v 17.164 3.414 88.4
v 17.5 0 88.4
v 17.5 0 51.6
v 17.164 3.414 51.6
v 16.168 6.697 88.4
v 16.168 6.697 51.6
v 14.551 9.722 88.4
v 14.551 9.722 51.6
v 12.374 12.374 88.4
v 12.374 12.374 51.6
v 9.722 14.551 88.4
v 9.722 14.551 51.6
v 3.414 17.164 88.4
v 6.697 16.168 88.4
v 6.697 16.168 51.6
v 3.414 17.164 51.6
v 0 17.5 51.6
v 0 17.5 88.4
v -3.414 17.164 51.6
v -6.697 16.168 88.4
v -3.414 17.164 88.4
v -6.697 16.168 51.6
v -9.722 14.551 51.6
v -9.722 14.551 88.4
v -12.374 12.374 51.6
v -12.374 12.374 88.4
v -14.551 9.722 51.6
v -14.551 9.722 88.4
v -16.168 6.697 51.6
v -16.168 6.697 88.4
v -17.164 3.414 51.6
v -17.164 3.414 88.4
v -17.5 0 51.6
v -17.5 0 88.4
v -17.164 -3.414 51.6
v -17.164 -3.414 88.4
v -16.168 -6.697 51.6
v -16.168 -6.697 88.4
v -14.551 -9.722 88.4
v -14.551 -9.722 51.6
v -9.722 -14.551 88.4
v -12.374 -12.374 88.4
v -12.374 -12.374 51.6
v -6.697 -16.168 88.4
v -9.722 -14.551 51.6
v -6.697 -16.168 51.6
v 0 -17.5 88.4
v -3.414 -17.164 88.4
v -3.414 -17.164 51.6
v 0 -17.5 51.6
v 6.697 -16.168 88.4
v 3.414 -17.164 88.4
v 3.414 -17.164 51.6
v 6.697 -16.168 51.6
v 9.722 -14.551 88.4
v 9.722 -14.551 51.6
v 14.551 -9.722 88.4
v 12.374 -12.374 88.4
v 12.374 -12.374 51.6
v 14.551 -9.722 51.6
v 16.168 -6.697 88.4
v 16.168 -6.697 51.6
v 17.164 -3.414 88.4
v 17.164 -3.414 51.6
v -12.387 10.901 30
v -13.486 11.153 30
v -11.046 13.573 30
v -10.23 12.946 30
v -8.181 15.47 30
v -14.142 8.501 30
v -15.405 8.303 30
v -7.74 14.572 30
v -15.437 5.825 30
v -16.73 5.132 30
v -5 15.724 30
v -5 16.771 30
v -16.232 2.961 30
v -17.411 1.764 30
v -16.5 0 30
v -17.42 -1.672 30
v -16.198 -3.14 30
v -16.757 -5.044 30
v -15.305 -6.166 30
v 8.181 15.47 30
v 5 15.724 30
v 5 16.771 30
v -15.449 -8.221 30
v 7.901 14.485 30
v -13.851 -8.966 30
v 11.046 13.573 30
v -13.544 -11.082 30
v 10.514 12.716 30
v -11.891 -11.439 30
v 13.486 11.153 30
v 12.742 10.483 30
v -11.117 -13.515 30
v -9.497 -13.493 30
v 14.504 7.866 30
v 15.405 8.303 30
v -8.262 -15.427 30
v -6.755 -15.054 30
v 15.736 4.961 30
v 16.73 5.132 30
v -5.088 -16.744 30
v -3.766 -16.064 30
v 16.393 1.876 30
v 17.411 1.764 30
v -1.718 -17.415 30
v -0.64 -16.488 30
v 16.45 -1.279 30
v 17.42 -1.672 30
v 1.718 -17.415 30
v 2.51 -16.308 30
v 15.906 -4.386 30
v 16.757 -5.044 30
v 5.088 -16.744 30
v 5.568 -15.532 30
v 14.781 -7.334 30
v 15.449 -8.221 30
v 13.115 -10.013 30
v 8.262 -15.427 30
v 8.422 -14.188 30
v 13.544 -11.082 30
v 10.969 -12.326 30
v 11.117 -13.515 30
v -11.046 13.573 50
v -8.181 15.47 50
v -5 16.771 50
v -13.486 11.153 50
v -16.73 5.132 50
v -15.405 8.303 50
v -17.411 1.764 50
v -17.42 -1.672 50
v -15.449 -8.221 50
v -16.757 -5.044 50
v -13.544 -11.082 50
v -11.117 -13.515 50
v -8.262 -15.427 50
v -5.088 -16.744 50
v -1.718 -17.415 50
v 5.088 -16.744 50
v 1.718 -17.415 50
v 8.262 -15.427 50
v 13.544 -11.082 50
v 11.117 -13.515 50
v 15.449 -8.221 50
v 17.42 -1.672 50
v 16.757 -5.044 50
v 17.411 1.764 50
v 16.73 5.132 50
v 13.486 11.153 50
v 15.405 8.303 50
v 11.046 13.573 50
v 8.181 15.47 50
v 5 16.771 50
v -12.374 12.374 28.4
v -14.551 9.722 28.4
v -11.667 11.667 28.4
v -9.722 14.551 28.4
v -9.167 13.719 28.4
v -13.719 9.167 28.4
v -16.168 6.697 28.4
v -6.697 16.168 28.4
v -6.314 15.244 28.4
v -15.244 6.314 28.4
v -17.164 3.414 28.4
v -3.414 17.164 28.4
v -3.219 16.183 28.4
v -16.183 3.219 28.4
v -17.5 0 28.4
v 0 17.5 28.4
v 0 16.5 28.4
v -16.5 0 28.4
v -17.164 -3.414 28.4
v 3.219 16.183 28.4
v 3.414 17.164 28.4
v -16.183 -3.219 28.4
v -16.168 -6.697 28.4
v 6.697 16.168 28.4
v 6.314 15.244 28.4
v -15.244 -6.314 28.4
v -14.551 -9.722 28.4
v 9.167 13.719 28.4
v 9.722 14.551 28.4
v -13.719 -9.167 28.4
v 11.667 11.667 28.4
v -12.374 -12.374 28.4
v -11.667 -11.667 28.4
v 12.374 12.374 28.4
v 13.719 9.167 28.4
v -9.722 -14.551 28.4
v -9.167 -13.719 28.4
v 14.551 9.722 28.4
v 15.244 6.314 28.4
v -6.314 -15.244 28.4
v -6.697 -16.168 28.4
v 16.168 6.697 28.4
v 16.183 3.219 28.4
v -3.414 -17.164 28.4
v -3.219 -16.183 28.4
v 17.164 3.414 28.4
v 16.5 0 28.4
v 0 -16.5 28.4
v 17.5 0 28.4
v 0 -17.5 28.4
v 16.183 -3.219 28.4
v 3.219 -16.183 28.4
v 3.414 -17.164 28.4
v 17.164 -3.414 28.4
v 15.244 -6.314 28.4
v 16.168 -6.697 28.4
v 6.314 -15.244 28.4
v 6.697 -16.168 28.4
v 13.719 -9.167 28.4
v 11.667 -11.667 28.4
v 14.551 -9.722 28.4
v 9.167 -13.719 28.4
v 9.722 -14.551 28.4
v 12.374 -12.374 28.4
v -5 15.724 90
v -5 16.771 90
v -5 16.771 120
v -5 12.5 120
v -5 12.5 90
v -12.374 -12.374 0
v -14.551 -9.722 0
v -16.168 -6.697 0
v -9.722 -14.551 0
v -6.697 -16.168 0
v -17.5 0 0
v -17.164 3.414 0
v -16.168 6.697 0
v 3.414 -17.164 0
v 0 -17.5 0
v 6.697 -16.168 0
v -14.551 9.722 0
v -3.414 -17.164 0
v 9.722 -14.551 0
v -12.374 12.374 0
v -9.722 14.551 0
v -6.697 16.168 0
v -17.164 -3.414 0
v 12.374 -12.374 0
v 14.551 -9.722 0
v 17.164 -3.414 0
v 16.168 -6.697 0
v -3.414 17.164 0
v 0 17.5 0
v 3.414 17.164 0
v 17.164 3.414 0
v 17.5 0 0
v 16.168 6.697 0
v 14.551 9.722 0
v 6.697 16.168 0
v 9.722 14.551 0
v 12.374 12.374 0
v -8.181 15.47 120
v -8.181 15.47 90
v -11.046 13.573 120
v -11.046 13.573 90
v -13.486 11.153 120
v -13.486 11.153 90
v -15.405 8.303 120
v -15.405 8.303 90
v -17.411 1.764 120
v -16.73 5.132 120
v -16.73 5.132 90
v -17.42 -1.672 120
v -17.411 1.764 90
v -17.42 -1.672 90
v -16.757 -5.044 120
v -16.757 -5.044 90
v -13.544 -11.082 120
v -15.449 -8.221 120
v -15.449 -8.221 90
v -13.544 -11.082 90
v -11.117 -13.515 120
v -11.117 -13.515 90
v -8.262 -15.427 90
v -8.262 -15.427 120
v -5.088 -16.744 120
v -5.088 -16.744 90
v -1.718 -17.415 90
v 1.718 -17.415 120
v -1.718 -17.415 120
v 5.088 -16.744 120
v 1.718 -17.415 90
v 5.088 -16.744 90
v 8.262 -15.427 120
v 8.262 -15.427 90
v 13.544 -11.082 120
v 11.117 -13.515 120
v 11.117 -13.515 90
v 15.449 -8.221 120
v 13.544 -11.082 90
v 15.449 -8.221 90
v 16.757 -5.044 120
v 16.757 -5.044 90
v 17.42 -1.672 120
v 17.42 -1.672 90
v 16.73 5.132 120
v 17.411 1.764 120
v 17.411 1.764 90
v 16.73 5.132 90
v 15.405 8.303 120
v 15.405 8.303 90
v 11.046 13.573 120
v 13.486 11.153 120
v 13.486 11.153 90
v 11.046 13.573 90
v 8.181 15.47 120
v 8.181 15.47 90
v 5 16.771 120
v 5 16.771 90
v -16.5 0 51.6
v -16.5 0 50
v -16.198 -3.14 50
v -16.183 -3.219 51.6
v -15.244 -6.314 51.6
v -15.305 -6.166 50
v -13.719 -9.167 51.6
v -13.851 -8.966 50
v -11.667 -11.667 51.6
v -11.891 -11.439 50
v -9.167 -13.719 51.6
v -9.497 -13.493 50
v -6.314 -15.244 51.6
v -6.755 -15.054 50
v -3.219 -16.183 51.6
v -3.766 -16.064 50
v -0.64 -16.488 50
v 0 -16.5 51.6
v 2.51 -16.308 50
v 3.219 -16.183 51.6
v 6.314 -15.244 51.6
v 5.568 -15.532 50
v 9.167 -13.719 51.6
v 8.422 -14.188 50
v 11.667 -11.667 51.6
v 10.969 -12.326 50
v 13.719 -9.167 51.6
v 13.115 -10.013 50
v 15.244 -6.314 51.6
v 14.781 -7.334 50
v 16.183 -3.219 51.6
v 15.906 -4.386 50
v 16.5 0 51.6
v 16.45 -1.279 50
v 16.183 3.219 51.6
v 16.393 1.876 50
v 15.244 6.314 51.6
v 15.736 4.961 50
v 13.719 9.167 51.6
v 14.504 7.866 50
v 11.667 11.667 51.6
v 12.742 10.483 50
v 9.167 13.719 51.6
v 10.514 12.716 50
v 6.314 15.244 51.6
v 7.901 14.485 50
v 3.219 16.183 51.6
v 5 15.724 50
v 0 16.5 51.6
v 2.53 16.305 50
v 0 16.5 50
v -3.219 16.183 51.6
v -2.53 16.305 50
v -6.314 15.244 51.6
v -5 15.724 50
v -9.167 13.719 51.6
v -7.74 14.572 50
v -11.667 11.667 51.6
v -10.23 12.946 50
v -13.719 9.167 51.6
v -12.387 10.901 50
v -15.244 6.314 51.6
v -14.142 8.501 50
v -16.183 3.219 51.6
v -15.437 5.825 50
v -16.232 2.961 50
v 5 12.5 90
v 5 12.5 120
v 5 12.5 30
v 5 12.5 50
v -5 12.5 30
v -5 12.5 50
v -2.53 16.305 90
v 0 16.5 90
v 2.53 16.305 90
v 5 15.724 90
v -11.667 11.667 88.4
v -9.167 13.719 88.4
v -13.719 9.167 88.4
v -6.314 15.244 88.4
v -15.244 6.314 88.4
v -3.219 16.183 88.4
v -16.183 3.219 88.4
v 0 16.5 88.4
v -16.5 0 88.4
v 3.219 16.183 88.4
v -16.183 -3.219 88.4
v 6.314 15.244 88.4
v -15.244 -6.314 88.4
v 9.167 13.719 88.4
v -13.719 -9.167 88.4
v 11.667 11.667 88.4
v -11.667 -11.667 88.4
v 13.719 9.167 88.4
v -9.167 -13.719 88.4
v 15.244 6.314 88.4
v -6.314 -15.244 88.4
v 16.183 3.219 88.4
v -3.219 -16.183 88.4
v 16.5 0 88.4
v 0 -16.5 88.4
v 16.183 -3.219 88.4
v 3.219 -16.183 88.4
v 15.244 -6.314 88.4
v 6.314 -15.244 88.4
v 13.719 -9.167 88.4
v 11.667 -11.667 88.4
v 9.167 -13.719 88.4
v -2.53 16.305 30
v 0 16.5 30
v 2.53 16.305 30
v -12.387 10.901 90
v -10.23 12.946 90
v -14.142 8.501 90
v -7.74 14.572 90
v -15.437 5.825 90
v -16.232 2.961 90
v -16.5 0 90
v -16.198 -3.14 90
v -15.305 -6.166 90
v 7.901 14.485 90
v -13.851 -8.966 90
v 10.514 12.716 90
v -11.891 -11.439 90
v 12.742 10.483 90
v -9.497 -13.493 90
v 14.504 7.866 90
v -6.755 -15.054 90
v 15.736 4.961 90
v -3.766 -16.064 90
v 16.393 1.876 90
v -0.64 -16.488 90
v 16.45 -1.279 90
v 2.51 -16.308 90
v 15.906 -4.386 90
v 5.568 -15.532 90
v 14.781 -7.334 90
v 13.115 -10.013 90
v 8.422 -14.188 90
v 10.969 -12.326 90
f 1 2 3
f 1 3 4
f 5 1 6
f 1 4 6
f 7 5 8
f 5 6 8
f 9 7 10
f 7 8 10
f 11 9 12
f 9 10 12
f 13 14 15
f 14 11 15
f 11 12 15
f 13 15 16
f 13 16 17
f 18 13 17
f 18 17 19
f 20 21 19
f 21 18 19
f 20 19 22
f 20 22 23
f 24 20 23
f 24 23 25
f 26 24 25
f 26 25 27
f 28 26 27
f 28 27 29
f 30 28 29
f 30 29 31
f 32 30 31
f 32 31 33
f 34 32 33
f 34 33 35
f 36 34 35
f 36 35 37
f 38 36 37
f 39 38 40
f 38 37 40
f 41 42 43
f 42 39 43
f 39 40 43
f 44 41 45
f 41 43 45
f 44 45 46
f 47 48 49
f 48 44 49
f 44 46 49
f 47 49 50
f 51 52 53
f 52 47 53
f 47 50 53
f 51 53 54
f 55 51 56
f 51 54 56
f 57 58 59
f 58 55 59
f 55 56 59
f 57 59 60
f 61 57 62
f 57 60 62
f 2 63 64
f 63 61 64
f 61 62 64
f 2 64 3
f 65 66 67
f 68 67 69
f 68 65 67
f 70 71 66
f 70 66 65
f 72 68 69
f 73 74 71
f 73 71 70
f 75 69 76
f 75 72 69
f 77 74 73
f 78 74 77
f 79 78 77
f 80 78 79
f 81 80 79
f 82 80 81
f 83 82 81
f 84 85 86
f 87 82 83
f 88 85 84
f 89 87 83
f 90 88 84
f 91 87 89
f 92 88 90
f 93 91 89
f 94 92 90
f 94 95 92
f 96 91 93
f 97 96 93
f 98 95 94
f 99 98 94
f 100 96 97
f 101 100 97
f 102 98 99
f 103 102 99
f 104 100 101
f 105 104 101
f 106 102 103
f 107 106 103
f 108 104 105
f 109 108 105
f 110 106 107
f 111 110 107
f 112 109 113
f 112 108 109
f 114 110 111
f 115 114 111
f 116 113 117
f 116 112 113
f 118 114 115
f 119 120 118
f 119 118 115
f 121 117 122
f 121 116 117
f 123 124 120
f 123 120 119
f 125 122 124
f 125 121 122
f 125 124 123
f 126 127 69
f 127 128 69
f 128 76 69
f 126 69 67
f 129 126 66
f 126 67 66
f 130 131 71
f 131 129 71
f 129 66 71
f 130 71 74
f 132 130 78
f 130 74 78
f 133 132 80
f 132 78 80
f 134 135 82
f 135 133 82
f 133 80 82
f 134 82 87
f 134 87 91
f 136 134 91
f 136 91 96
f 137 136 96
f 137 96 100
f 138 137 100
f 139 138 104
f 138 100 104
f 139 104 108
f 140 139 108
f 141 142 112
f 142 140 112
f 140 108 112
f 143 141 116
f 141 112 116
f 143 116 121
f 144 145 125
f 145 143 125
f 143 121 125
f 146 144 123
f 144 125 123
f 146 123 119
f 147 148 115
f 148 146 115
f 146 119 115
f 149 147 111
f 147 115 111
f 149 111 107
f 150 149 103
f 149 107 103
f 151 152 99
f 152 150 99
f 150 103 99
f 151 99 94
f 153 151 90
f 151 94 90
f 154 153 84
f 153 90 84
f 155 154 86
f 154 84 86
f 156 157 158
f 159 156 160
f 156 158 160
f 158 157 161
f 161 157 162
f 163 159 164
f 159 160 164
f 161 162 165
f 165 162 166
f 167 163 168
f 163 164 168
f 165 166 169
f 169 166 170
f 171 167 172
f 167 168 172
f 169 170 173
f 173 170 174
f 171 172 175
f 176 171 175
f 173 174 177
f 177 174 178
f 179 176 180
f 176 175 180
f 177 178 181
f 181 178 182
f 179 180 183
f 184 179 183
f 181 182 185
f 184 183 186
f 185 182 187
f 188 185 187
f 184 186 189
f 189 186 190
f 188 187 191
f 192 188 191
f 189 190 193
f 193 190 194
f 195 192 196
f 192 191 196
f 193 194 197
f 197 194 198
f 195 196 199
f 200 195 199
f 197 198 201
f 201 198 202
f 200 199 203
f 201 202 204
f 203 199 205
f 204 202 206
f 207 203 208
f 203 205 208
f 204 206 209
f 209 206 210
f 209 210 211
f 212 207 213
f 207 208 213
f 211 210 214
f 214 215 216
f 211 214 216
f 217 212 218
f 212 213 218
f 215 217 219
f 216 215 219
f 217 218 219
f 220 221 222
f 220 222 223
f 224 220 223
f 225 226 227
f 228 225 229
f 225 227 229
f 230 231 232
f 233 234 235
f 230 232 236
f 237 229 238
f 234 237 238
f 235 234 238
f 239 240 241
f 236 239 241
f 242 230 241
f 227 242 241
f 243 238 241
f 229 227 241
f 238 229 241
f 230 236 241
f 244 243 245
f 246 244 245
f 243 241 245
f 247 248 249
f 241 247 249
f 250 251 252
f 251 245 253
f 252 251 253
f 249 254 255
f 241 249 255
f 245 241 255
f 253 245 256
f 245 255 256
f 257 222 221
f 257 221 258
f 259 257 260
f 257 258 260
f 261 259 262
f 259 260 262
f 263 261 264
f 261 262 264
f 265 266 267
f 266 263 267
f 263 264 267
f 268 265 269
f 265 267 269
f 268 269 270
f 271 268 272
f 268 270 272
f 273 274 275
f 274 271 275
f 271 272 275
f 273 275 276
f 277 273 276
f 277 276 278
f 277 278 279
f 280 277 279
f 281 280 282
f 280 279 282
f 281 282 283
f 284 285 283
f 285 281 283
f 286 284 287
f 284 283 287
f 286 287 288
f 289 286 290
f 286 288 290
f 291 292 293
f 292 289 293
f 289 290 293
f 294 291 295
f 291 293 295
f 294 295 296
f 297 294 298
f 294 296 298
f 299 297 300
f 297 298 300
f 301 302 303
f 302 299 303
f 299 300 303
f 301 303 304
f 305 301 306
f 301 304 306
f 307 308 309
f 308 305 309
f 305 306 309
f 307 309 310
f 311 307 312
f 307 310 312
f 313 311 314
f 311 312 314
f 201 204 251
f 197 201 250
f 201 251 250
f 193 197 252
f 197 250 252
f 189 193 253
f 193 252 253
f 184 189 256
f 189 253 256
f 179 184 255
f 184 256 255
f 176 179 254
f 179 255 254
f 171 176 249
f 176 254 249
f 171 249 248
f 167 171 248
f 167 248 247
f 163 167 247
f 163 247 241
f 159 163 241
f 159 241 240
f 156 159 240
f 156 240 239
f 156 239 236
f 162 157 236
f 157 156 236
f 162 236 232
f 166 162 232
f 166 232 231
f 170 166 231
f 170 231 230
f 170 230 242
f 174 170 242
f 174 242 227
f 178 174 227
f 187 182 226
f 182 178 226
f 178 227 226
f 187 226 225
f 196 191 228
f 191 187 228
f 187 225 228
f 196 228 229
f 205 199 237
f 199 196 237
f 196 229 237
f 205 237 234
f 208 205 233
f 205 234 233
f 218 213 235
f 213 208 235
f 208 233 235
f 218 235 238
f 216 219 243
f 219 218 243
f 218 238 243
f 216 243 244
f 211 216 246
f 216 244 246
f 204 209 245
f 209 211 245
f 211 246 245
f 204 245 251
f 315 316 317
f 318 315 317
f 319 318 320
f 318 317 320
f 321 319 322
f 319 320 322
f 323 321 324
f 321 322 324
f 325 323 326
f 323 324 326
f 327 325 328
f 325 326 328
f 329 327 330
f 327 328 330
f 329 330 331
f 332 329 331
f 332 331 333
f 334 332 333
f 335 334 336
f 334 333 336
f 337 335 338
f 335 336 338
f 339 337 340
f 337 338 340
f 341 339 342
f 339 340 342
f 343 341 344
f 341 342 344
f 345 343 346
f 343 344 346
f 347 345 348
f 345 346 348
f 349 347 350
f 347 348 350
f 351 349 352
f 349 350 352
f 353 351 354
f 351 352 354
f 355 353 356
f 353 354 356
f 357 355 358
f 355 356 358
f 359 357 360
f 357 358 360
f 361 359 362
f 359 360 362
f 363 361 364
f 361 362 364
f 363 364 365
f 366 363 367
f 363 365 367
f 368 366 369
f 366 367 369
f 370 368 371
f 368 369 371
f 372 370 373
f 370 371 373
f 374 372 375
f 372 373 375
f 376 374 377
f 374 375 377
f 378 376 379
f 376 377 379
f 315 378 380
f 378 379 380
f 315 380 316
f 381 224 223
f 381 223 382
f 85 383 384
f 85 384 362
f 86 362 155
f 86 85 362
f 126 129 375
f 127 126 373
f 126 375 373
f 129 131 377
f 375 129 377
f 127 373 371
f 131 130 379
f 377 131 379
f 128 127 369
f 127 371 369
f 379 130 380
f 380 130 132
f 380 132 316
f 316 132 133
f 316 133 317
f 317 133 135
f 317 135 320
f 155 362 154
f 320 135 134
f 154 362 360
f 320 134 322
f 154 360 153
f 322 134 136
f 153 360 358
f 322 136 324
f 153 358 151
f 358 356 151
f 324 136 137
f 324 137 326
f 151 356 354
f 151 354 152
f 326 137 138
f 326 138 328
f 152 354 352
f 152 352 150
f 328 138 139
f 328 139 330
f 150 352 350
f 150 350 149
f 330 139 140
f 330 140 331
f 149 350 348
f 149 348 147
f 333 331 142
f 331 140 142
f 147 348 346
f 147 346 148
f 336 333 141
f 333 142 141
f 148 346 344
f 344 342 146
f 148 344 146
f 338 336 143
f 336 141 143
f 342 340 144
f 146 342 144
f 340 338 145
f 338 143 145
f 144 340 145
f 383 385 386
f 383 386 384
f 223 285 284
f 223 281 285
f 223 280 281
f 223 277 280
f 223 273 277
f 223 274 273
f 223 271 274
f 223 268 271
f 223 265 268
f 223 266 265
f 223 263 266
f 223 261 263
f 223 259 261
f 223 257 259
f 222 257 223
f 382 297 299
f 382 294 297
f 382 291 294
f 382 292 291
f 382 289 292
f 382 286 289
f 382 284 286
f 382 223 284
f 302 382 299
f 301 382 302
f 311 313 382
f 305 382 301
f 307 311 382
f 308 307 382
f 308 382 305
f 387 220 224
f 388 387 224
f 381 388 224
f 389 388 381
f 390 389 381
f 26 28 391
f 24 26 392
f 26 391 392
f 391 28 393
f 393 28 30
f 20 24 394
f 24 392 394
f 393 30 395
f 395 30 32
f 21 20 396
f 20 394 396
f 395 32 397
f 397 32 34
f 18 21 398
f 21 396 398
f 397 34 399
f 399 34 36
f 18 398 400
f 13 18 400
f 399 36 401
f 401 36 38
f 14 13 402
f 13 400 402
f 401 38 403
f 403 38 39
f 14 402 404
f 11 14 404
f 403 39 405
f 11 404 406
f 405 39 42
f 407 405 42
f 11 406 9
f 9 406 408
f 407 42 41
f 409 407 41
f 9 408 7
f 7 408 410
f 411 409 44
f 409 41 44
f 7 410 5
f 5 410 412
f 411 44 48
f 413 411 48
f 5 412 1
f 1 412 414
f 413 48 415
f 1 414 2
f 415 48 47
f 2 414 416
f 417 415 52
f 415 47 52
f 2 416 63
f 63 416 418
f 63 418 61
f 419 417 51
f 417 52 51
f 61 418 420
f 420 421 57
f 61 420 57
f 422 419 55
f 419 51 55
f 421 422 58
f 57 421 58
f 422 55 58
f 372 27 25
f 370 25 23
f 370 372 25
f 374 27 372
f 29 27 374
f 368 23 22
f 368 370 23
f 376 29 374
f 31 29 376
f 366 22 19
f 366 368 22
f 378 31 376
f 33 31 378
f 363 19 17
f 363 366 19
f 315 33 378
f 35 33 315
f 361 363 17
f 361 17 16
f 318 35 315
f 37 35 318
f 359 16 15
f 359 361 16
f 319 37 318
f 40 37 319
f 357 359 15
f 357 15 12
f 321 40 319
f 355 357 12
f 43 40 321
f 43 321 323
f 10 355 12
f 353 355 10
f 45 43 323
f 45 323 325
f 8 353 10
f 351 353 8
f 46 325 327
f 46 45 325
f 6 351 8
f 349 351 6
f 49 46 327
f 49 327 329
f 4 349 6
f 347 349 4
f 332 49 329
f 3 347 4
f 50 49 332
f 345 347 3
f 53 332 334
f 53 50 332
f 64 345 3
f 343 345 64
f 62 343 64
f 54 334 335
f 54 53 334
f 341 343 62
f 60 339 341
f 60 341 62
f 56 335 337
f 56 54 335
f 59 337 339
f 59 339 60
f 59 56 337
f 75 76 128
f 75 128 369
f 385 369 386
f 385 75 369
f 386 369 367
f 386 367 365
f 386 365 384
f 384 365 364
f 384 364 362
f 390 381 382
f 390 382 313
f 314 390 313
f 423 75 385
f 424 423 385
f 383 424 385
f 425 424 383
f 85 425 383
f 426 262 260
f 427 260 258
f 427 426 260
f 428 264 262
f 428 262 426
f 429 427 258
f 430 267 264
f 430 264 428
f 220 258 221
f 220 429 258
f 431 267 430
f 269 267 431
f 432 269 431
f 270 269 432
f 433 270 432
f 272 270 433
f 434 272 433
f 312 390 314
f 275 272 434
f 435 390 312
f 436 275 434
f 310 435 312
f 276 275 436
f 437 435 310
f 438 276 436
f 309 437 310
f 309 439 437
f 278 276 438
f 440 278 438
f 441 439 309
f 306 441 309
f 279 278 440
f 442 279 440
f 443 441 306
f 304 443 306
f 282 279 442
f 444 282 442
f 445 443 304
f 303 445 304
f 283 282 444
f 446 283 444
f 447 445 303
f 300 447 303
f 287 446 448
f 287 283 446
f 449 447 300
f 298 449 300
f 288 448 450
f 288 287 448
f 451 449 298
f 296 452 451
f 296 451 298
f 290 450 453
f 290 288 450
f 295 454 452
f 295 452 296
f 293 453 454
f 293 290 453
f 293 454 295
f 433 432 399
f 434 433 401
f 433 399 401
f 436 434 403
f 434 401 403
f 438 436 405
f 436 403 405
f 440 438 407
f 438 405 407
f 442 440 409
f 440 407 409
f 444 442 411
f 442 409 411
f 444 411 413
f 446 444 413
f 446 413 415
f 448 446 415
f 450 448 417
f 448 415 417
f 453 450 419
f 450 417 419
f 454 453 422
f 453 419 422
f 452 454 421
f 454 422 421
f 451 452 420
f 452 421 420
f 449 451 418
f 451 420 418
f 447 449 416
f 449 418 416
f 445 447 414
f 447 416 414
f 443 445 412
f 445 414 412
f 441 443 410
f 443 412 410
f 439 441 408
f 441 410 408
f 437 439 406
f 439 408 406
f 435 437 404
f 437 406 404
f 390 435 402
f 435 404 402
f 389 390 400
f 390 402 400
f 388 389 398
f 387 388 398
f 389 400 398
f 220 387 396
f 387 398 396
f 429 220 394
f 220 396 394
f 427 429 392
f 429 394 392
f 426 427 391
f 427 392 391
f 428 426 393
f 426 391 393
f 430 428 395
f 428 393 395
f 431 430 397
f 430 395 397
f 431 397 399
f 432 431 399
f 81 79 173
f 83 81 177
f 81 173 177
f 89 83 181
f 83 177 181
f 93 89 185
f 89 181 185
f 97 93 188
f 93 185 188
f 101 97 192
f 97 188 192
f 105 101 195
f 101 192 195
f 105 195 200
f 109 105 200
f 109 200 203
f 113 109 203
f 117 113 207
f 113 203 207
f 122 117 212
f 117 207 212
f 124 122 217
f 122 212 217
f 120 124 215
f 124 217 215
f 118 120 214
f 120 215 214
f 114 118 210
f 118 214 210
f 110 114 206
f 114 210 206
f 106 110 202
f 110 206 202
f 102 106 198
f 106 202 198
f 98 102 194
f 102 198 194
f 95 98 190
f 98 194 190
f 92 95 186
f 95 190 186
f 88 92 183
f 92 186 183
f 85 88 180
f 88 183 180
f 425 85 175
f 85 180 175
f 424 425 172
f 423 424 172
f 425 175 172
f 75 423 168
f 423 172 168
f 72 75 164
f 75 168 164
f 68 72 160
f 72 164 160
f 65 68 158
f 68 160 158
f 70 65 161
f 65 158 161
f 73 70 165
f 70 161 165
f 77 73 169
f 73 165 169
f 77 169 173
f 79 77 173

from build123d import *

# Parameters (mm, degrees)
SKETCH1_R           = 17.5
BOSS_EXTRUDE1_DEPTH = 120
CUT_EXTRUDE1_START  = 30
CUT_EXTRUDE1_DEPTH  = 20
CUT_EXTRUDE2_START  = 90
CUT_EXTRUDE2_DEPTH  = 30
SKETCH3_W           = 1.6
SKETCH3_H           = 1


with BuildPart() as part:
    # Sketch1 → Boss-Extrude1 (new body)
    with BuildSketch(Plane.XY):
        Circle(SKETCH1_R)
    extrude(amount=BOSS_EXTRUDE1_DEPTH)

    # Sketch2 → Cut-Extrude1 (cut)
    with BuildSketch(Plane.XY.offset(CUT_EXTRUDE1_START)):
        with BuildLine():
            Line((-5, 16.770509831), (-5, 12.5))
            Line((-5, 12.5), (5, 12.5))
            Line((5, 12.5), (5, 16.770509831))
            ThreePointArc((5, 16.770509831), (0, 17.5), (-5, 16.770509831))
        make_face()
    extrude(amount=CUT_EXTRUDE1_DEPTH, mode=Mode.SUBTRACT)

    # Sketch2<2> → Cut-Extrude2 (cut)
    with BuildSketch(Plane.XY.offset(CUT_EXTRUDE2_START)):
        with BuildLine():
            Line((-5, 16.770509831), (-5, 12.5))
            Line((-5, 12.5), (5, 12.5))
            Line((5, 12.5), (5, 16.770509831))
            ThreePointArc((5, 16.770509831), (0, 17.5), (-5, 16.770509831))
        make_face()
    extrude(amount=CUT_EXTRUDE2_DEPTH, mode=Mode.SUBTRACT)

    # Sketch3 → Cut-Revolve2 (revolve, cut)
    with BuildSketch(Plane(origin=(0, 0, 0), x_dir=(0, 0, -1), z_dir=(1, 0, 0))):
        with Locations((-29.2, 17)):
            Rectangle(SKETCH3_W, SKETCH3_H)
        with Locations((-50.8, 17)):
            Rectangle(SKETCH3_W, SKETCH3_H)
        with Locations((-89.2, 17)):
            Rectangle(SKETCH3_W, SKETCH3_H)
    revolve(axis=Axis((0, 0, 0), (0, 0, 1)), mode=Mode.SUBTRACT)


solid = part.part
